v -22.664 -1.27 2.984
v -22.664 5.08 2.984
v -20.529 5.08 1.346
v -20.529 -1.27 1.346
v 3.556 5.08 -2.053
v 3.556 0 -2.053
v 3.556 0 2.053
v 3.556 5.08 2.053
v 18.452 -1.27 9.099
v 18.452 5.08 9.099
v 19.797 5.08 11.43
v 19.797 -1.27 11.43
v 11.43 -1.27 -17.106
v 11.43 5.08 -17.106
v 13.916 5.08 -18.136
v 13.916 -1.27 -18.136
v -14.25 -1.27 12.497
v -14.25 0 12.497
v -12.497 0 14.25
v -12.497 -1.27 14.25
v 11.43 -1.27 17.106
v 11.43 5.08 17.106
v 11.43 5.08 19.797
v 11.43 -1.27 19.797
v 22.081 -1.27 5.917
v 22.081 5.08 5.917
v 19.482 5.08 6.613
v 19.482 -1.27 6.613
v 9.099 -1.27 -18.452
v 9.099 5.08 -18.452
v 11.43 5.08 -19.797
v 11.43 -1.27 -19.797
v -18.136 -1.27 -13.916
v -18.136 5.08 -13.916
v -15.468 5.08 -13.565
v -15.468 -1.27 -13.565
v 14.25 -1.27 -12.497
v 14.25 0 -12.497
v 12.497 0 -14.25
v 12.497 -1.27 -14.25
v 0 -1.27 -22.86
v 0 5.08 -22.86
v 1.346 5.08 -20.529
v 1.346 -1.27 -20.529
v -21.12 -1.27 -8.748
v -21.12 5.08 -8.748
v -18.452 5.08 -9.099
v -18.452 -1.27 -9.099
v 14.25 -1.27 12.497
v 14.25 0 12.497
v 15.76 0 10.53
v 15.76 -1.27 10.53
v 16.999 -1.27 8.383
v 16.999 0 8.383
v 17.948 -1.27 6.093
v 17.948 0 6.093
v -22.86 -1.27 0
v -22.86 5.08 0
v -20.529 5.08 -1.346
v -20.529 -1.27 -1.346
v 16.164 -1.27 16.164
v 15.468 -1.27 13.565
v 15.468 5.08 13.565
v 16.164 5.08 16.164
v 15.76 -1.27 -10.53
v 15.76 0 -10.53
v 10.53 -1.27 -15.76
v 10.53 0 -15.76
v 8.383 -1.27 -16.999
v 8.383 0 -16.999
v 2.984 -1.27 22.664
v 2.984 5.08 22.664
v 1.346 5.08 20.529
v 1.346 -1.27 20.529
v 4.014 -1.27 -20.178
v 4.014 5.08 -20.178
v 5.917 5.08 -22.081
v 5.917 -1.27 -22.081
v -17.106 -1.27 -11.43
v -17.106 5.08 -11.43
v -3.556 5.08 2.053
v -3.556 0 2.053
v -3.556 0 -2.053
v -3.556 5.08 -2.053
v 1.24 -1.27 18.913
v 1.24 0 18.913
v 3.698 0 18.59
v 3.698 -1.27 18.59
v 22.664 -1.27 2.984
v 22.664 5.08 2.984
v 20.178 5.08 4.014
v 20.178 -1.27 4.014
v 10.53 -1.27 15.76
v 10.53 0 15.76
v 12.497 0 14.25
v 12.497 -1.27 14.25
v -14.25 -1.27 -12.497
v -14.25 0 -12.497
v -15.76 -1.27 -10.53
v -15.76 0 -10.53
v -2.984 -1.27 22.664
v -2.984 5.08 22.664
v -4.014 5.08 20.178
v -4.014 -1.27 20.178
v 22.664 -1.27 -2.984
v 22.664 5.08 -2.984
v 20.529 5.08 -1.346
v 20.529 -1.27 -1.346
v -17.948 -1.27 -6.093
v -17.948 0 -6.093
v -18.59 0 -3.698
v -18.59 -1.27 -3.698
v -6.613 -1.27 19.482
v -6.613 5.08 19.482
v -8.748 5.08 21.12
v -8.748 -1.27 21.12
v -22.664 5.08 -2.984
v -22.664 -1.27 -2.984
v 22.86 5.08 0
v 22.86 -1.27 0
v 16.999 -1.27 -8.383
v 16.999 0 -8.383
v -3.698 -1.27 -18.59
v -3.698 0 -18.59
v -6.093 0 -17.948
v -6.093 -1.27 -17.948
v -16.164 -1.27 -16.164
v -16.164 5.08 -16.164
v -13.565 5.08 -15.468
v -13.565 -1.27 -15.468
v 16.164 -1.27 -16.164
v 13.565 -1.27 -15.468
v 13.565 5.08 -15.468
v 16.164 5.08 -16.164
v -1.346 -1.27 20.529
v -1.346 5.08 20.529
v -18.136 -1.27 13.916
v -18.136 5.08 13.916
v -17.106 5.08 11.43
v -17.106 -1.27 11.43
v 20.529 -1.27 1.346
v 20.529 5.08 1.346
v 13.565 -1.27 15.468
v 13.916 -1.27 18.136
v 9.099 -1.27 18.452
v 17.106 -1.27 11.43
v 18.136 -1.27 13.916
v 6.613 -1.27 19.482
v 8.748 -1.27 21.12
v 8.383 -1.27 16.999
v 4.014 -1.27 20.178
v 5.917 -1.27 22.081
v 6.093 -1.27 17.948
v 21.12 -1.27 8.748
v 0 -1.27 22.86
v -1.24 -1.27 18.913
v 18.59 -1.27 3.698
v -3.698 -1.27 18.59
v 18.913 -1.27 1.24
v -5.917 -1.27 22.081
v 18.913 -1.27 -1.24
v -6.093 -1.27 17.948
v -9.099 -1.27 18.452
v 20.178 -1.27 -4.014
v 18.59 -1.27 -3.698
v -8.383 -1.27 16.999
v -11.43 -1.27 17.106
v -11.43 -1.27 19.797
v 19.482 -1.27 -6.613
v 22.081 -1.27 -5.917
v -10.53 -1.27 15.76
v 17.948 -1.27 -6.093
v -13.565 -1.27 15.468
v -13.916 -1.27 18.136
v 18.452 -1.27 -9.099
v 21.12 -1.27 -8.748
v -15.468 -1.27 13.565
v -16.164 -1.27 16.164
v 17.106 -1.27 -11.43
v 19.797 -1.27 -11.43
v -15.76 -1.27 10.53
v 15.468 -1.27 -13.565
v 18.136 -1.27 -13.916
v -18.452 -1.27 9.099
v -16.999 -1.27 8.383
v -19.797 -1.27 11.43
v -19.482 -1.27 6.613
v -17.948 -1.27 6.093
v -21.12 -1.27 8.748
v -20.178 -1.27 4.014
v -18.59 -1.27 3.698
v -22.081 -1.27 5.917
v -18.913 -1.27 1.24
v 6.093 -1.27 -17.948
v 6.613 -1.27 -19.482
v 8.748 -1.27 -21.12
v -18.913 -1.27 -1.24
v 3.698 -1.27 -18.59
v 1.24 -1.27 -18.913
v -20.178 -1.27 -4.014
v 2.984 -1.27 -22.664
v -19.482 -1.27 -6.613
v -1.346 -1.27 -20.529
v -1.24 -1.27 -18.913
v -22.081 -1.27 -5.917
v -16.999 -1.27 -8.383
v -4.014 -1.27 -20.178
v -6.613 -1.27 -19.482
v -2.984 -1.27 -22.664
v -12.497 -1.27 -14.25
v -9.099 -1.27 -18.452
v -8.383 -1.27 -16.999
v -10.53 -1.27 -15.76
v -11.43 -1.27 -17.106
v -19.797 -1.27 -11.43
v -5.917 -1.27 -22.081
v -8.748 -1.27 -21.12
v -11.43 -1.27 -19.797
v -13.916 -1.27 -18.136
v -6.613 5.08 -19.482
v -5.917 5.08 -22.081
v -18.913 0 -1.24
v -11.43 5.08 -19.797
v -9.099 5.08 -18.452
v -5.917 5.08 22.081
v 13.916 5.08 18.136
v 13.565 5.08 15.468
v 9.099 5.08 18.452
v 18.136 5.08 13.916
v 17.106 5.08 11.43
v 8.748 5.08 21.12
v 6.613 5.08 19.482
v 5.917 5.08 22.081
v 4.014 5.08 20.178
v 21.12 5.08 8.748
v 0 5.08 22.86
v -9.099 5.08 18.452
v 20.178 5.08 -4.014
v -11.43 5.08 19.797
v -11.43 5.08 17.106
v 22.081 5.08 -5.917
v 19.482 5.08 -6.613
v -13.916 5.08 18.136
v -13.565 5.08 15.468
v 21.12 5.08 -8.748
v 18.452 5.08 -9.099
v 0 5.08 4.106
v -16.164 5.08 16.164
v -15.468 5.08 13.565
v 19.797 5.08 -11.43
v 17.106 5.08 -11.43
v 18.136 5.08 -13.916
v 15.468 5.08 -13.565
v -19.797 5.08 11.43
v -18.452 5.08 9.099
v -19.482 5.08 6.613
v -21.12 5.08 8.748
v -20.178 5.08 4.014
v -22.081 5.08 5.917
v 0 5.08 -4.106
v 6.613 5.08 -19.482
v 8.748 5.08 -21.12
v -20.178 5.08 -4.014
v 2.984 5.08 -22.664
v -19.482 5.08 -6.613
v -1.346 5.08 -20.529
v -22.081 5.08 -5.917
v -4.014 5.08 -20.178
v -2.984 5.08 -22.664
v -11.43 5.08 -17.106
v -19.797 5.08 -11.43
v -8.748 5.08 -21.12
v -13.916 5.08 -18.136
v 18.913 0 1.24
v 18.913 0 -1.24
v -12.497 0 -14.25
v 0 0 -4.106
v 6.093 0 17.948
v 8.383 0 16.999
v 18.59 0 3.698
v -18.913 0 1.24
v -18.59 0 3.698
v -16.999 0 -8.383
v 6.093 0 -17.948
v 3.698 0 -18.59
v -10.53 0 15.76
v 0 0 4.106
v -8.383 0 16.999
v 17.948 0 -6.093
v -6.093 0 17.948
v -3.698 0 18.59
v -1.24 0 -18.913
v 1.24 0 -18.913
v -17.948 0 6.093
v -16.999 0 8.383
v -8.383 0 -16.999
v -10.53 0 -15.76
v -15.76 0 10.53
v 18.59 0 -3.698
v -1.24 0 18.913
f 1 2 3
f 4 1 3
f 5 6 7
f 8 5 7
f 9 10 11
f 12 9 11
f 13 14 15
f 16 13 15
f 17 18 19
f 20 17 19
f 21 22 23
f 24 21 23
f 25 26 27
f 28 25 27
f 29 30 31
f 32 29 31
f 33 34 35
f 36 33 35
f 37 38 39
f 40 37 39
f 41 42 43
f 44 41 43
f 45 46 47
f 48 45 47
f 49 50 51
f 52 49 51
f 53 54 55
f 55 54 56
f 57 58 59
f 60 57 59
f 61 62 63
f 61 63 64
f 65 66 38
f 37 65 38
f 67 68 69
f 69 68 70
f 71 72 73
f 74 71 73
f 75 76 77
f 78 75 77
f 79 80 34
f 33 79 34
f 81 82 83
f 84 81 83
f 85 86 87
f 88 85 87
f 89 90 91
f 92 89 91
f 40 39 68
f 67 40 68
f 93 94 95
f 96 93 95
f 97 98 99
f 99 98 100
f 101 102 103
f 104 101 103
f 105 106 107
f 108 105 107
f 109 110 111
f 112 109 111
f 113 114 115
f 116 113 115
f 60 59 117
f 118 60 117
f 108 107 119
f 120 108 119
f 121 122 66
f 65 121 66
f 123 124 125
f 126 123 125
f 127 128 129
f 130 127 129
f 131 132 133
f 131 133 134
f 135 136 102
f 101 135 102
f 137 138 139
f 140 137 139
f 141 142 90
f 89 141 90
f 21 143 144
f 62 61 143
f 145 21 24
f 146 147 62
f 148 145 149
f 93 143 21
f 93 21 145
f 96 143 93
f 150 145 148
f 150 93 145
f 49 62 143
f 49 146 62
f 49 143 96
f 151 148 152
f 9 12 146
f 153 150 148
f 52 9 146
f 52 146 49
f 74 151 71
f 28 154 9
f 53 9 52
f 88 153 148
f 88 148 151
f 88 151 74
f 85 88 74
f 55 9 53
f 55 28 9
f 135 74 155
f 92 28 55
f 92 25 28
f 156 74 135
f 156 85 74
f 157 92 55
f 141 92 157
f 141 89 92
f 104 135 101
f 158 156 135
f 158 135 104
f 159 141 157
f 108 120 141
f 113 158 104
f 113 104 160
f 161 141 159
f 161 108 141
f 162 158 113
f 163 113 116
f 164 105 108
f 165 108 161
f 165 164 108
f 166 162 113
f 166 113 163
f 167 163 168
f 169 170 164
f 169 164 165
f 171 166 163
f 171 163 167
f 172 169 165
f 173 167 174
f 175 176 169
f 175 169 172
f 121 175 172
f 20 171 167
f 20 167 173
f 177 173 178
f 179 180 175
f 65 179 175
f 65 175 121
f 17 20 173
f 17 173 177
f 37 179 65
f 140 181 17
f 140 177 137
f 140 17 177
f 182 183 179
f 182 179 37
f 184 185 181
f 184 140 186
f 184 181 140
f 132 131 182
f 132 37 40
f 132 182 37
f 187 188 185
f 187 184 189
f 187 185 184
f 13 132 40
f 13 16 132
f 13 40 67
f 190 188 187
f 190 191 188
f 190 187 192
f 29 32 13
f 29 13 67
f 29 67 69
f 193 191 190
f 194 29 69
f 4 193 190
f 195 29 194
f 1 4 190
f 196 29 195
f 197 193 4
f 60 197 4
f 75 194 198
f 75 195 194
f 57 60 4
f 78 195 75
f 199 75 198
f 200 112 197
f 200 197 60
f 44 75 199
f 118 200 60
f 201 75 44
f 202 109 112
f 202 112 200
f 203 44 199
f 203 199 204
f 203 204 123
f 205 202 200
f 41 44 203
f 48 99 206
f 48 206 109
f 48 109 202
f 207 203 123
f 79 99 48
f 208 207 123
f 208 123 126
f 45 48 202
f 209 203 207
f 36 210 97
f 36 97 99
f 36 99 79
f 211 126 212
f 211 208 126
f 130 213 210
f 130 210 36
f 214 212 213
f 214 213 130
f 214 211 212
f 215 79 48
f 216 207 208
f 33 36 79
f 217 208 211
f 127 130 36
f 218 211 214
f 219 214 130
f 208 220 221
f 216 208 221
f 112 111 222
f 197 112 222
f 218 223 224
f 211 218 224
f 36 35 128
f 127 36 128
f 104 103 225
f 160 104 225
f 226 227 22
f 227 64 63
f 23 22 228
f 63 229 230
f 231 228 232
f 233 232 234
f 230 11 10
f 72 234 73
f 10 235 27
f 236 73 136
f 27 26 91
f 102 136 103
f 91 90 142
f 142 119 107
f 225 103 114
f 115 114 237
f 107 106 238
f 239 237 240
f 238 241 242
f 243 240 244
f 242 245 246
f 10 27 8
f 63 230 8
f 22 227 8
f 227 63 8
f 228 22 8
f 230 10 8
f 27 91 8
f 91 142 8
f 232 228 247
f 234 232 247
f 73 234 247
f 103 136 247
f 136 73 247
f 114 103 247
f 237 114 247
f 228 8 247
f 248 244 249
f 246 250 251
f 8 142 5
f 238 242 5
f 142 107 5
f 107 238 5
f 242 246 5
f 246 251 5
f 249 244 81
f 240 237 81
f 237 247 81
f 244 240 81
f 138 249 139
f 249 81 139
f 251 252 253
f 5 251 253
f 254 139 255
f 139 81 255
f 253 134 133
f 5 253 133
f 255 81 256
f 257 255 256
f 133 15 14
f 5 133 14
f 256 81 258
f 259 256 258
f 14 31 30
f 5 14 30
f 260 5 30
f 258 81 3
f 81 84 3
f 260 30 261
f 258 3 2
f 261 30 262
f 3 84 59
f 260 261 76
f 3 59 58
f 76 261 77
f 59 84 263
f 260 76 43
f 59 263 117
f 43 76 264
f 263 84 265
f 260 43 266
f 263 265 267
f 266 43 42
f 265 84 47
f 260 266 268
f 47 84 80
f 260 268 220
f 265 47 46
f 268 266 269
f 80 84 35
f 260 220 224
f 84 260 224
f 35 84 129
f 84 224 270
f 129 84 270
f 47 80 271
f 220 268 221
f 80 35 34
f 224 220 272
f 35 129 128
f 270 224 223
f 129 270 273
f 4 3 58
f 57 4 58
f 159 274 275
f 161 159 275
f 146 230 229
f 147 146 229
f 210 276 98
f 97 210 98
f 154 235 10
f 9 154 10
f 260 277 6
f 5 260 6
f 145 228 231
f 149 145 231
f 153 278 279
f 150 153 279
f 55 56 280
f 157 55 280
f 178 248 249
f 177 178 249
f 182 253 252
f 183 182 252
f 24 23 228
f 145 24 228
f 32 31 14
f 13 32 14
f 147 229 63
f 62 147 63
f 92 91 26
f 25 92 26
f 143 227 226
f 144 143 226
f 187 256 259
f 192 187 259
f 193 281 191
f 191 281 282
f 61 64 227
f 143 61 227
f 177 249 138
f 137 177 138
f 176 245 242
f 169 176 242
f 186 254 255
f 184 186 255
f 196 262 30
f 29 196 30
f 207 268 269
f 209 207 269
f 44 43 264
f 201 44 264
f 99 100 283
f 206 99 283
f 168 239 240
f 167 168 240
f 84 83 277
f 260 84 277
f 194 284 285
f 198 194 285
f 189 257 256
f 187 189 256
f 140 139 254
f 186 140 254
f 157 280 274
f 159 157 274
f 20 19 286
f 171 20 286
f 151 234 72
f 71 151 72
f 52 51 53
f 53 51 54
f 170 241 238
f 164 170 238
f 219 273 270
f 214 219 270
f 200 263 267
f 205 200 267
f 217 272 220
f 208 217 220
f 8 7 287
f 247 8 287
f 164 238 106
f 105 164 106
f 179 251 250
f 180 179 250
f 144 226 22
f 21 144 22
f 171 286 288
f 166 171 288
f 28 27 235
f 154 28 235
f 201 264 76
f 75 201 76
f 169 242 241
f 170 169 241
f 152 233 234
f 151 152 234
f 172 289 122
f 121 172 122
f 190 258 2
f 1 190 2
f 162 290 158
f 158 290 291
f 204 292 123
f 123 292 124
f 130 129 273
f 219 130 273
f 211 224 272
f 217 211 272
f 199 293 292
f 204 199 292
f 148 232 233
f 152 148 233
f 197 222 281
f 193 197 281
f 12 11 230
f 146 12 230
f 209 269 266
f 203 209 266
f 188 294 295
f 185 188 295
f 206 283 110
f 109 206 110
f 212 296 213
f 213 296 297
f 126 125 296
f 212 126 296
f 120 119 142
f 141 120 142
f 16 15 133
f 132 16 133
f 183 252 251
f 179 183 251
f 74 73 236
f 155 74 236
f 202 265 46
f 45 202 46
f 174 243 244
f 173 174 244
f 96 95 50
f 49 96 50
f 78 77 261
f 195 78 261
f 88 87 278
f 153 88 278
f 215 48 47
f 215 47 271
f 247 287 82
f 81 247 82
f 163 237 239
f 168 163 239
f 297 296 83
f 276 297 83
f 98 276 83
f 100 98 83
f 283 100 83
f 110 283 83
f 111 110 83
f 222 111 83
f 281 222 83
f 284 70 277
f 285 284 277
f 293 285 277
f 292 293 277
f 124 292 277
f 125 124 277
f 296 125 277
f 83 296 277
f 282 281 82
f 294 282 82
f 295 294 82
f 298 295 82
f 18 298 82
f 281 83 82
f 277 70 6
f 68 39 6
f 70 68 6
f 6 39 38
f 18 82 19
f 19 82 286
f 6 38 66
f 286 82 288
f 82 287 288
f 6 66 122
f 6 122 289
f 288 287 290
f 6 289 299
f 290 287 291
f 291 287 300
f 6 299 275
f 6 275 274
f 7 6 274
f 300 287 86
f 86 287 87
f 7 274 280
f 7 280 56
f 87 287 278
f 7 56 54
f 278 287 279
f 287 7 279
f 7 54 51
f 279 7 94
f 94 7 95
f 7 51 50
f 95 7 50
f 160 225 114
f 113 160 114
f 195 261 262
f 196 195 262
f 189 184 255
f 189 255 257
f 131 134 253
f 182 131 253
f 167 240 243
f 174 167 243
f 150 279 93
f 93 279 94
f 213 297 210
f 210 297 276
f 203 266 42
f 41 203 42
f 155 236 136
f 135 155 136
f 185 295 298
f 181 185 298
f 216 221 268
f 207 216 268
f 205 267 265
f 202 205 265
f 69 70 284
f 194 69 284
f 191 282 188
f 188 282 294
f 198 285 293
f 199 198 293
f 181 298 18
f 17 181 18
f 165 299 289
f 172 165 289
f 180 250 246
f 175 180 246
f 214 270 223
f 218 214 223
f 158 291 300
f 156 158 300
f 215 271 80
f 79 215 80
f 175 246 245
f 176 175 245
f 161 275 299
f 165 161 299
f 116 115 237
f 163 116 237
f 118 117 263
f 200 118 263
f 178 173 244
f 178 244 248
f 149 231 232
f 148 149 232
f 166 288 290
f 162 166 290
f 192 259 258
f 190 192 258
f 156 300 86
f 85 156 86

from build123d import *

# Parameters (mm, degrees)
SKETCH1_R           = 19.05
BOSS_EXTRUDE1_DEPTH = 5.08
BOSS_EXTRUDE3_DEPTH = 6.35
CIRPATTERN1_COUNT   = 48
CUT_EXTRUDE1_DEPTH  = 33.725610766


with BuildPart() as part:
    # Sketch1 → Boss-Extrude1 (new body)
    with BuildSketch(Plane(origin=(0, 0, 0), x_dir=(1, 0, 0), z_dir=(0, 1, 0))):
        Circle(SKETCH1_R)
    extrude(amount=BOSS_EXTRUDE1_DEPTH)

    # Sketch3 → Boss-Extrude3 (add)
    with BuildSketch(Plane(origin=(0, 5.08, 0), x_dir=(1, 0, 0), z_dir=(0, 1, 0))):
        Polygon((0, 22.86), (2.278670365, 18.913227154), (-2.278670365, 18.913227154), align=None)
    boss_extrude3 = extrude(amount=-BOSS_EXTRUDE3_DEPTH)

    # CirPattern1: Boss-Extrude3 ×48 about axis
    cirpattern1_axis = Axis((0, -0.127, 0), (0, 1, 0))
    for i in range(1, CIRPATTERN1_COUNT):
        add(boss_extrude3.rotate(cirpattern1_axis, i * 360 / CIRPATTERN1_COUNT))

    # Sketch6 → Cut-Extrude1 (cut, through all)
    with BuildSketch(Plane.XZ):
        Polygon((0, -4.106115114), (3.556, -2.053057557), (3.556, 2.053057557), (0, 4.106115114), (-3.556, 2.053057557), (-3.556, -2.053057557), align=None)
    extrude(amount=-CUT_EXTRUDE1_DEPTH, mode=Mode.SUBTRACT)


solid = part.part
